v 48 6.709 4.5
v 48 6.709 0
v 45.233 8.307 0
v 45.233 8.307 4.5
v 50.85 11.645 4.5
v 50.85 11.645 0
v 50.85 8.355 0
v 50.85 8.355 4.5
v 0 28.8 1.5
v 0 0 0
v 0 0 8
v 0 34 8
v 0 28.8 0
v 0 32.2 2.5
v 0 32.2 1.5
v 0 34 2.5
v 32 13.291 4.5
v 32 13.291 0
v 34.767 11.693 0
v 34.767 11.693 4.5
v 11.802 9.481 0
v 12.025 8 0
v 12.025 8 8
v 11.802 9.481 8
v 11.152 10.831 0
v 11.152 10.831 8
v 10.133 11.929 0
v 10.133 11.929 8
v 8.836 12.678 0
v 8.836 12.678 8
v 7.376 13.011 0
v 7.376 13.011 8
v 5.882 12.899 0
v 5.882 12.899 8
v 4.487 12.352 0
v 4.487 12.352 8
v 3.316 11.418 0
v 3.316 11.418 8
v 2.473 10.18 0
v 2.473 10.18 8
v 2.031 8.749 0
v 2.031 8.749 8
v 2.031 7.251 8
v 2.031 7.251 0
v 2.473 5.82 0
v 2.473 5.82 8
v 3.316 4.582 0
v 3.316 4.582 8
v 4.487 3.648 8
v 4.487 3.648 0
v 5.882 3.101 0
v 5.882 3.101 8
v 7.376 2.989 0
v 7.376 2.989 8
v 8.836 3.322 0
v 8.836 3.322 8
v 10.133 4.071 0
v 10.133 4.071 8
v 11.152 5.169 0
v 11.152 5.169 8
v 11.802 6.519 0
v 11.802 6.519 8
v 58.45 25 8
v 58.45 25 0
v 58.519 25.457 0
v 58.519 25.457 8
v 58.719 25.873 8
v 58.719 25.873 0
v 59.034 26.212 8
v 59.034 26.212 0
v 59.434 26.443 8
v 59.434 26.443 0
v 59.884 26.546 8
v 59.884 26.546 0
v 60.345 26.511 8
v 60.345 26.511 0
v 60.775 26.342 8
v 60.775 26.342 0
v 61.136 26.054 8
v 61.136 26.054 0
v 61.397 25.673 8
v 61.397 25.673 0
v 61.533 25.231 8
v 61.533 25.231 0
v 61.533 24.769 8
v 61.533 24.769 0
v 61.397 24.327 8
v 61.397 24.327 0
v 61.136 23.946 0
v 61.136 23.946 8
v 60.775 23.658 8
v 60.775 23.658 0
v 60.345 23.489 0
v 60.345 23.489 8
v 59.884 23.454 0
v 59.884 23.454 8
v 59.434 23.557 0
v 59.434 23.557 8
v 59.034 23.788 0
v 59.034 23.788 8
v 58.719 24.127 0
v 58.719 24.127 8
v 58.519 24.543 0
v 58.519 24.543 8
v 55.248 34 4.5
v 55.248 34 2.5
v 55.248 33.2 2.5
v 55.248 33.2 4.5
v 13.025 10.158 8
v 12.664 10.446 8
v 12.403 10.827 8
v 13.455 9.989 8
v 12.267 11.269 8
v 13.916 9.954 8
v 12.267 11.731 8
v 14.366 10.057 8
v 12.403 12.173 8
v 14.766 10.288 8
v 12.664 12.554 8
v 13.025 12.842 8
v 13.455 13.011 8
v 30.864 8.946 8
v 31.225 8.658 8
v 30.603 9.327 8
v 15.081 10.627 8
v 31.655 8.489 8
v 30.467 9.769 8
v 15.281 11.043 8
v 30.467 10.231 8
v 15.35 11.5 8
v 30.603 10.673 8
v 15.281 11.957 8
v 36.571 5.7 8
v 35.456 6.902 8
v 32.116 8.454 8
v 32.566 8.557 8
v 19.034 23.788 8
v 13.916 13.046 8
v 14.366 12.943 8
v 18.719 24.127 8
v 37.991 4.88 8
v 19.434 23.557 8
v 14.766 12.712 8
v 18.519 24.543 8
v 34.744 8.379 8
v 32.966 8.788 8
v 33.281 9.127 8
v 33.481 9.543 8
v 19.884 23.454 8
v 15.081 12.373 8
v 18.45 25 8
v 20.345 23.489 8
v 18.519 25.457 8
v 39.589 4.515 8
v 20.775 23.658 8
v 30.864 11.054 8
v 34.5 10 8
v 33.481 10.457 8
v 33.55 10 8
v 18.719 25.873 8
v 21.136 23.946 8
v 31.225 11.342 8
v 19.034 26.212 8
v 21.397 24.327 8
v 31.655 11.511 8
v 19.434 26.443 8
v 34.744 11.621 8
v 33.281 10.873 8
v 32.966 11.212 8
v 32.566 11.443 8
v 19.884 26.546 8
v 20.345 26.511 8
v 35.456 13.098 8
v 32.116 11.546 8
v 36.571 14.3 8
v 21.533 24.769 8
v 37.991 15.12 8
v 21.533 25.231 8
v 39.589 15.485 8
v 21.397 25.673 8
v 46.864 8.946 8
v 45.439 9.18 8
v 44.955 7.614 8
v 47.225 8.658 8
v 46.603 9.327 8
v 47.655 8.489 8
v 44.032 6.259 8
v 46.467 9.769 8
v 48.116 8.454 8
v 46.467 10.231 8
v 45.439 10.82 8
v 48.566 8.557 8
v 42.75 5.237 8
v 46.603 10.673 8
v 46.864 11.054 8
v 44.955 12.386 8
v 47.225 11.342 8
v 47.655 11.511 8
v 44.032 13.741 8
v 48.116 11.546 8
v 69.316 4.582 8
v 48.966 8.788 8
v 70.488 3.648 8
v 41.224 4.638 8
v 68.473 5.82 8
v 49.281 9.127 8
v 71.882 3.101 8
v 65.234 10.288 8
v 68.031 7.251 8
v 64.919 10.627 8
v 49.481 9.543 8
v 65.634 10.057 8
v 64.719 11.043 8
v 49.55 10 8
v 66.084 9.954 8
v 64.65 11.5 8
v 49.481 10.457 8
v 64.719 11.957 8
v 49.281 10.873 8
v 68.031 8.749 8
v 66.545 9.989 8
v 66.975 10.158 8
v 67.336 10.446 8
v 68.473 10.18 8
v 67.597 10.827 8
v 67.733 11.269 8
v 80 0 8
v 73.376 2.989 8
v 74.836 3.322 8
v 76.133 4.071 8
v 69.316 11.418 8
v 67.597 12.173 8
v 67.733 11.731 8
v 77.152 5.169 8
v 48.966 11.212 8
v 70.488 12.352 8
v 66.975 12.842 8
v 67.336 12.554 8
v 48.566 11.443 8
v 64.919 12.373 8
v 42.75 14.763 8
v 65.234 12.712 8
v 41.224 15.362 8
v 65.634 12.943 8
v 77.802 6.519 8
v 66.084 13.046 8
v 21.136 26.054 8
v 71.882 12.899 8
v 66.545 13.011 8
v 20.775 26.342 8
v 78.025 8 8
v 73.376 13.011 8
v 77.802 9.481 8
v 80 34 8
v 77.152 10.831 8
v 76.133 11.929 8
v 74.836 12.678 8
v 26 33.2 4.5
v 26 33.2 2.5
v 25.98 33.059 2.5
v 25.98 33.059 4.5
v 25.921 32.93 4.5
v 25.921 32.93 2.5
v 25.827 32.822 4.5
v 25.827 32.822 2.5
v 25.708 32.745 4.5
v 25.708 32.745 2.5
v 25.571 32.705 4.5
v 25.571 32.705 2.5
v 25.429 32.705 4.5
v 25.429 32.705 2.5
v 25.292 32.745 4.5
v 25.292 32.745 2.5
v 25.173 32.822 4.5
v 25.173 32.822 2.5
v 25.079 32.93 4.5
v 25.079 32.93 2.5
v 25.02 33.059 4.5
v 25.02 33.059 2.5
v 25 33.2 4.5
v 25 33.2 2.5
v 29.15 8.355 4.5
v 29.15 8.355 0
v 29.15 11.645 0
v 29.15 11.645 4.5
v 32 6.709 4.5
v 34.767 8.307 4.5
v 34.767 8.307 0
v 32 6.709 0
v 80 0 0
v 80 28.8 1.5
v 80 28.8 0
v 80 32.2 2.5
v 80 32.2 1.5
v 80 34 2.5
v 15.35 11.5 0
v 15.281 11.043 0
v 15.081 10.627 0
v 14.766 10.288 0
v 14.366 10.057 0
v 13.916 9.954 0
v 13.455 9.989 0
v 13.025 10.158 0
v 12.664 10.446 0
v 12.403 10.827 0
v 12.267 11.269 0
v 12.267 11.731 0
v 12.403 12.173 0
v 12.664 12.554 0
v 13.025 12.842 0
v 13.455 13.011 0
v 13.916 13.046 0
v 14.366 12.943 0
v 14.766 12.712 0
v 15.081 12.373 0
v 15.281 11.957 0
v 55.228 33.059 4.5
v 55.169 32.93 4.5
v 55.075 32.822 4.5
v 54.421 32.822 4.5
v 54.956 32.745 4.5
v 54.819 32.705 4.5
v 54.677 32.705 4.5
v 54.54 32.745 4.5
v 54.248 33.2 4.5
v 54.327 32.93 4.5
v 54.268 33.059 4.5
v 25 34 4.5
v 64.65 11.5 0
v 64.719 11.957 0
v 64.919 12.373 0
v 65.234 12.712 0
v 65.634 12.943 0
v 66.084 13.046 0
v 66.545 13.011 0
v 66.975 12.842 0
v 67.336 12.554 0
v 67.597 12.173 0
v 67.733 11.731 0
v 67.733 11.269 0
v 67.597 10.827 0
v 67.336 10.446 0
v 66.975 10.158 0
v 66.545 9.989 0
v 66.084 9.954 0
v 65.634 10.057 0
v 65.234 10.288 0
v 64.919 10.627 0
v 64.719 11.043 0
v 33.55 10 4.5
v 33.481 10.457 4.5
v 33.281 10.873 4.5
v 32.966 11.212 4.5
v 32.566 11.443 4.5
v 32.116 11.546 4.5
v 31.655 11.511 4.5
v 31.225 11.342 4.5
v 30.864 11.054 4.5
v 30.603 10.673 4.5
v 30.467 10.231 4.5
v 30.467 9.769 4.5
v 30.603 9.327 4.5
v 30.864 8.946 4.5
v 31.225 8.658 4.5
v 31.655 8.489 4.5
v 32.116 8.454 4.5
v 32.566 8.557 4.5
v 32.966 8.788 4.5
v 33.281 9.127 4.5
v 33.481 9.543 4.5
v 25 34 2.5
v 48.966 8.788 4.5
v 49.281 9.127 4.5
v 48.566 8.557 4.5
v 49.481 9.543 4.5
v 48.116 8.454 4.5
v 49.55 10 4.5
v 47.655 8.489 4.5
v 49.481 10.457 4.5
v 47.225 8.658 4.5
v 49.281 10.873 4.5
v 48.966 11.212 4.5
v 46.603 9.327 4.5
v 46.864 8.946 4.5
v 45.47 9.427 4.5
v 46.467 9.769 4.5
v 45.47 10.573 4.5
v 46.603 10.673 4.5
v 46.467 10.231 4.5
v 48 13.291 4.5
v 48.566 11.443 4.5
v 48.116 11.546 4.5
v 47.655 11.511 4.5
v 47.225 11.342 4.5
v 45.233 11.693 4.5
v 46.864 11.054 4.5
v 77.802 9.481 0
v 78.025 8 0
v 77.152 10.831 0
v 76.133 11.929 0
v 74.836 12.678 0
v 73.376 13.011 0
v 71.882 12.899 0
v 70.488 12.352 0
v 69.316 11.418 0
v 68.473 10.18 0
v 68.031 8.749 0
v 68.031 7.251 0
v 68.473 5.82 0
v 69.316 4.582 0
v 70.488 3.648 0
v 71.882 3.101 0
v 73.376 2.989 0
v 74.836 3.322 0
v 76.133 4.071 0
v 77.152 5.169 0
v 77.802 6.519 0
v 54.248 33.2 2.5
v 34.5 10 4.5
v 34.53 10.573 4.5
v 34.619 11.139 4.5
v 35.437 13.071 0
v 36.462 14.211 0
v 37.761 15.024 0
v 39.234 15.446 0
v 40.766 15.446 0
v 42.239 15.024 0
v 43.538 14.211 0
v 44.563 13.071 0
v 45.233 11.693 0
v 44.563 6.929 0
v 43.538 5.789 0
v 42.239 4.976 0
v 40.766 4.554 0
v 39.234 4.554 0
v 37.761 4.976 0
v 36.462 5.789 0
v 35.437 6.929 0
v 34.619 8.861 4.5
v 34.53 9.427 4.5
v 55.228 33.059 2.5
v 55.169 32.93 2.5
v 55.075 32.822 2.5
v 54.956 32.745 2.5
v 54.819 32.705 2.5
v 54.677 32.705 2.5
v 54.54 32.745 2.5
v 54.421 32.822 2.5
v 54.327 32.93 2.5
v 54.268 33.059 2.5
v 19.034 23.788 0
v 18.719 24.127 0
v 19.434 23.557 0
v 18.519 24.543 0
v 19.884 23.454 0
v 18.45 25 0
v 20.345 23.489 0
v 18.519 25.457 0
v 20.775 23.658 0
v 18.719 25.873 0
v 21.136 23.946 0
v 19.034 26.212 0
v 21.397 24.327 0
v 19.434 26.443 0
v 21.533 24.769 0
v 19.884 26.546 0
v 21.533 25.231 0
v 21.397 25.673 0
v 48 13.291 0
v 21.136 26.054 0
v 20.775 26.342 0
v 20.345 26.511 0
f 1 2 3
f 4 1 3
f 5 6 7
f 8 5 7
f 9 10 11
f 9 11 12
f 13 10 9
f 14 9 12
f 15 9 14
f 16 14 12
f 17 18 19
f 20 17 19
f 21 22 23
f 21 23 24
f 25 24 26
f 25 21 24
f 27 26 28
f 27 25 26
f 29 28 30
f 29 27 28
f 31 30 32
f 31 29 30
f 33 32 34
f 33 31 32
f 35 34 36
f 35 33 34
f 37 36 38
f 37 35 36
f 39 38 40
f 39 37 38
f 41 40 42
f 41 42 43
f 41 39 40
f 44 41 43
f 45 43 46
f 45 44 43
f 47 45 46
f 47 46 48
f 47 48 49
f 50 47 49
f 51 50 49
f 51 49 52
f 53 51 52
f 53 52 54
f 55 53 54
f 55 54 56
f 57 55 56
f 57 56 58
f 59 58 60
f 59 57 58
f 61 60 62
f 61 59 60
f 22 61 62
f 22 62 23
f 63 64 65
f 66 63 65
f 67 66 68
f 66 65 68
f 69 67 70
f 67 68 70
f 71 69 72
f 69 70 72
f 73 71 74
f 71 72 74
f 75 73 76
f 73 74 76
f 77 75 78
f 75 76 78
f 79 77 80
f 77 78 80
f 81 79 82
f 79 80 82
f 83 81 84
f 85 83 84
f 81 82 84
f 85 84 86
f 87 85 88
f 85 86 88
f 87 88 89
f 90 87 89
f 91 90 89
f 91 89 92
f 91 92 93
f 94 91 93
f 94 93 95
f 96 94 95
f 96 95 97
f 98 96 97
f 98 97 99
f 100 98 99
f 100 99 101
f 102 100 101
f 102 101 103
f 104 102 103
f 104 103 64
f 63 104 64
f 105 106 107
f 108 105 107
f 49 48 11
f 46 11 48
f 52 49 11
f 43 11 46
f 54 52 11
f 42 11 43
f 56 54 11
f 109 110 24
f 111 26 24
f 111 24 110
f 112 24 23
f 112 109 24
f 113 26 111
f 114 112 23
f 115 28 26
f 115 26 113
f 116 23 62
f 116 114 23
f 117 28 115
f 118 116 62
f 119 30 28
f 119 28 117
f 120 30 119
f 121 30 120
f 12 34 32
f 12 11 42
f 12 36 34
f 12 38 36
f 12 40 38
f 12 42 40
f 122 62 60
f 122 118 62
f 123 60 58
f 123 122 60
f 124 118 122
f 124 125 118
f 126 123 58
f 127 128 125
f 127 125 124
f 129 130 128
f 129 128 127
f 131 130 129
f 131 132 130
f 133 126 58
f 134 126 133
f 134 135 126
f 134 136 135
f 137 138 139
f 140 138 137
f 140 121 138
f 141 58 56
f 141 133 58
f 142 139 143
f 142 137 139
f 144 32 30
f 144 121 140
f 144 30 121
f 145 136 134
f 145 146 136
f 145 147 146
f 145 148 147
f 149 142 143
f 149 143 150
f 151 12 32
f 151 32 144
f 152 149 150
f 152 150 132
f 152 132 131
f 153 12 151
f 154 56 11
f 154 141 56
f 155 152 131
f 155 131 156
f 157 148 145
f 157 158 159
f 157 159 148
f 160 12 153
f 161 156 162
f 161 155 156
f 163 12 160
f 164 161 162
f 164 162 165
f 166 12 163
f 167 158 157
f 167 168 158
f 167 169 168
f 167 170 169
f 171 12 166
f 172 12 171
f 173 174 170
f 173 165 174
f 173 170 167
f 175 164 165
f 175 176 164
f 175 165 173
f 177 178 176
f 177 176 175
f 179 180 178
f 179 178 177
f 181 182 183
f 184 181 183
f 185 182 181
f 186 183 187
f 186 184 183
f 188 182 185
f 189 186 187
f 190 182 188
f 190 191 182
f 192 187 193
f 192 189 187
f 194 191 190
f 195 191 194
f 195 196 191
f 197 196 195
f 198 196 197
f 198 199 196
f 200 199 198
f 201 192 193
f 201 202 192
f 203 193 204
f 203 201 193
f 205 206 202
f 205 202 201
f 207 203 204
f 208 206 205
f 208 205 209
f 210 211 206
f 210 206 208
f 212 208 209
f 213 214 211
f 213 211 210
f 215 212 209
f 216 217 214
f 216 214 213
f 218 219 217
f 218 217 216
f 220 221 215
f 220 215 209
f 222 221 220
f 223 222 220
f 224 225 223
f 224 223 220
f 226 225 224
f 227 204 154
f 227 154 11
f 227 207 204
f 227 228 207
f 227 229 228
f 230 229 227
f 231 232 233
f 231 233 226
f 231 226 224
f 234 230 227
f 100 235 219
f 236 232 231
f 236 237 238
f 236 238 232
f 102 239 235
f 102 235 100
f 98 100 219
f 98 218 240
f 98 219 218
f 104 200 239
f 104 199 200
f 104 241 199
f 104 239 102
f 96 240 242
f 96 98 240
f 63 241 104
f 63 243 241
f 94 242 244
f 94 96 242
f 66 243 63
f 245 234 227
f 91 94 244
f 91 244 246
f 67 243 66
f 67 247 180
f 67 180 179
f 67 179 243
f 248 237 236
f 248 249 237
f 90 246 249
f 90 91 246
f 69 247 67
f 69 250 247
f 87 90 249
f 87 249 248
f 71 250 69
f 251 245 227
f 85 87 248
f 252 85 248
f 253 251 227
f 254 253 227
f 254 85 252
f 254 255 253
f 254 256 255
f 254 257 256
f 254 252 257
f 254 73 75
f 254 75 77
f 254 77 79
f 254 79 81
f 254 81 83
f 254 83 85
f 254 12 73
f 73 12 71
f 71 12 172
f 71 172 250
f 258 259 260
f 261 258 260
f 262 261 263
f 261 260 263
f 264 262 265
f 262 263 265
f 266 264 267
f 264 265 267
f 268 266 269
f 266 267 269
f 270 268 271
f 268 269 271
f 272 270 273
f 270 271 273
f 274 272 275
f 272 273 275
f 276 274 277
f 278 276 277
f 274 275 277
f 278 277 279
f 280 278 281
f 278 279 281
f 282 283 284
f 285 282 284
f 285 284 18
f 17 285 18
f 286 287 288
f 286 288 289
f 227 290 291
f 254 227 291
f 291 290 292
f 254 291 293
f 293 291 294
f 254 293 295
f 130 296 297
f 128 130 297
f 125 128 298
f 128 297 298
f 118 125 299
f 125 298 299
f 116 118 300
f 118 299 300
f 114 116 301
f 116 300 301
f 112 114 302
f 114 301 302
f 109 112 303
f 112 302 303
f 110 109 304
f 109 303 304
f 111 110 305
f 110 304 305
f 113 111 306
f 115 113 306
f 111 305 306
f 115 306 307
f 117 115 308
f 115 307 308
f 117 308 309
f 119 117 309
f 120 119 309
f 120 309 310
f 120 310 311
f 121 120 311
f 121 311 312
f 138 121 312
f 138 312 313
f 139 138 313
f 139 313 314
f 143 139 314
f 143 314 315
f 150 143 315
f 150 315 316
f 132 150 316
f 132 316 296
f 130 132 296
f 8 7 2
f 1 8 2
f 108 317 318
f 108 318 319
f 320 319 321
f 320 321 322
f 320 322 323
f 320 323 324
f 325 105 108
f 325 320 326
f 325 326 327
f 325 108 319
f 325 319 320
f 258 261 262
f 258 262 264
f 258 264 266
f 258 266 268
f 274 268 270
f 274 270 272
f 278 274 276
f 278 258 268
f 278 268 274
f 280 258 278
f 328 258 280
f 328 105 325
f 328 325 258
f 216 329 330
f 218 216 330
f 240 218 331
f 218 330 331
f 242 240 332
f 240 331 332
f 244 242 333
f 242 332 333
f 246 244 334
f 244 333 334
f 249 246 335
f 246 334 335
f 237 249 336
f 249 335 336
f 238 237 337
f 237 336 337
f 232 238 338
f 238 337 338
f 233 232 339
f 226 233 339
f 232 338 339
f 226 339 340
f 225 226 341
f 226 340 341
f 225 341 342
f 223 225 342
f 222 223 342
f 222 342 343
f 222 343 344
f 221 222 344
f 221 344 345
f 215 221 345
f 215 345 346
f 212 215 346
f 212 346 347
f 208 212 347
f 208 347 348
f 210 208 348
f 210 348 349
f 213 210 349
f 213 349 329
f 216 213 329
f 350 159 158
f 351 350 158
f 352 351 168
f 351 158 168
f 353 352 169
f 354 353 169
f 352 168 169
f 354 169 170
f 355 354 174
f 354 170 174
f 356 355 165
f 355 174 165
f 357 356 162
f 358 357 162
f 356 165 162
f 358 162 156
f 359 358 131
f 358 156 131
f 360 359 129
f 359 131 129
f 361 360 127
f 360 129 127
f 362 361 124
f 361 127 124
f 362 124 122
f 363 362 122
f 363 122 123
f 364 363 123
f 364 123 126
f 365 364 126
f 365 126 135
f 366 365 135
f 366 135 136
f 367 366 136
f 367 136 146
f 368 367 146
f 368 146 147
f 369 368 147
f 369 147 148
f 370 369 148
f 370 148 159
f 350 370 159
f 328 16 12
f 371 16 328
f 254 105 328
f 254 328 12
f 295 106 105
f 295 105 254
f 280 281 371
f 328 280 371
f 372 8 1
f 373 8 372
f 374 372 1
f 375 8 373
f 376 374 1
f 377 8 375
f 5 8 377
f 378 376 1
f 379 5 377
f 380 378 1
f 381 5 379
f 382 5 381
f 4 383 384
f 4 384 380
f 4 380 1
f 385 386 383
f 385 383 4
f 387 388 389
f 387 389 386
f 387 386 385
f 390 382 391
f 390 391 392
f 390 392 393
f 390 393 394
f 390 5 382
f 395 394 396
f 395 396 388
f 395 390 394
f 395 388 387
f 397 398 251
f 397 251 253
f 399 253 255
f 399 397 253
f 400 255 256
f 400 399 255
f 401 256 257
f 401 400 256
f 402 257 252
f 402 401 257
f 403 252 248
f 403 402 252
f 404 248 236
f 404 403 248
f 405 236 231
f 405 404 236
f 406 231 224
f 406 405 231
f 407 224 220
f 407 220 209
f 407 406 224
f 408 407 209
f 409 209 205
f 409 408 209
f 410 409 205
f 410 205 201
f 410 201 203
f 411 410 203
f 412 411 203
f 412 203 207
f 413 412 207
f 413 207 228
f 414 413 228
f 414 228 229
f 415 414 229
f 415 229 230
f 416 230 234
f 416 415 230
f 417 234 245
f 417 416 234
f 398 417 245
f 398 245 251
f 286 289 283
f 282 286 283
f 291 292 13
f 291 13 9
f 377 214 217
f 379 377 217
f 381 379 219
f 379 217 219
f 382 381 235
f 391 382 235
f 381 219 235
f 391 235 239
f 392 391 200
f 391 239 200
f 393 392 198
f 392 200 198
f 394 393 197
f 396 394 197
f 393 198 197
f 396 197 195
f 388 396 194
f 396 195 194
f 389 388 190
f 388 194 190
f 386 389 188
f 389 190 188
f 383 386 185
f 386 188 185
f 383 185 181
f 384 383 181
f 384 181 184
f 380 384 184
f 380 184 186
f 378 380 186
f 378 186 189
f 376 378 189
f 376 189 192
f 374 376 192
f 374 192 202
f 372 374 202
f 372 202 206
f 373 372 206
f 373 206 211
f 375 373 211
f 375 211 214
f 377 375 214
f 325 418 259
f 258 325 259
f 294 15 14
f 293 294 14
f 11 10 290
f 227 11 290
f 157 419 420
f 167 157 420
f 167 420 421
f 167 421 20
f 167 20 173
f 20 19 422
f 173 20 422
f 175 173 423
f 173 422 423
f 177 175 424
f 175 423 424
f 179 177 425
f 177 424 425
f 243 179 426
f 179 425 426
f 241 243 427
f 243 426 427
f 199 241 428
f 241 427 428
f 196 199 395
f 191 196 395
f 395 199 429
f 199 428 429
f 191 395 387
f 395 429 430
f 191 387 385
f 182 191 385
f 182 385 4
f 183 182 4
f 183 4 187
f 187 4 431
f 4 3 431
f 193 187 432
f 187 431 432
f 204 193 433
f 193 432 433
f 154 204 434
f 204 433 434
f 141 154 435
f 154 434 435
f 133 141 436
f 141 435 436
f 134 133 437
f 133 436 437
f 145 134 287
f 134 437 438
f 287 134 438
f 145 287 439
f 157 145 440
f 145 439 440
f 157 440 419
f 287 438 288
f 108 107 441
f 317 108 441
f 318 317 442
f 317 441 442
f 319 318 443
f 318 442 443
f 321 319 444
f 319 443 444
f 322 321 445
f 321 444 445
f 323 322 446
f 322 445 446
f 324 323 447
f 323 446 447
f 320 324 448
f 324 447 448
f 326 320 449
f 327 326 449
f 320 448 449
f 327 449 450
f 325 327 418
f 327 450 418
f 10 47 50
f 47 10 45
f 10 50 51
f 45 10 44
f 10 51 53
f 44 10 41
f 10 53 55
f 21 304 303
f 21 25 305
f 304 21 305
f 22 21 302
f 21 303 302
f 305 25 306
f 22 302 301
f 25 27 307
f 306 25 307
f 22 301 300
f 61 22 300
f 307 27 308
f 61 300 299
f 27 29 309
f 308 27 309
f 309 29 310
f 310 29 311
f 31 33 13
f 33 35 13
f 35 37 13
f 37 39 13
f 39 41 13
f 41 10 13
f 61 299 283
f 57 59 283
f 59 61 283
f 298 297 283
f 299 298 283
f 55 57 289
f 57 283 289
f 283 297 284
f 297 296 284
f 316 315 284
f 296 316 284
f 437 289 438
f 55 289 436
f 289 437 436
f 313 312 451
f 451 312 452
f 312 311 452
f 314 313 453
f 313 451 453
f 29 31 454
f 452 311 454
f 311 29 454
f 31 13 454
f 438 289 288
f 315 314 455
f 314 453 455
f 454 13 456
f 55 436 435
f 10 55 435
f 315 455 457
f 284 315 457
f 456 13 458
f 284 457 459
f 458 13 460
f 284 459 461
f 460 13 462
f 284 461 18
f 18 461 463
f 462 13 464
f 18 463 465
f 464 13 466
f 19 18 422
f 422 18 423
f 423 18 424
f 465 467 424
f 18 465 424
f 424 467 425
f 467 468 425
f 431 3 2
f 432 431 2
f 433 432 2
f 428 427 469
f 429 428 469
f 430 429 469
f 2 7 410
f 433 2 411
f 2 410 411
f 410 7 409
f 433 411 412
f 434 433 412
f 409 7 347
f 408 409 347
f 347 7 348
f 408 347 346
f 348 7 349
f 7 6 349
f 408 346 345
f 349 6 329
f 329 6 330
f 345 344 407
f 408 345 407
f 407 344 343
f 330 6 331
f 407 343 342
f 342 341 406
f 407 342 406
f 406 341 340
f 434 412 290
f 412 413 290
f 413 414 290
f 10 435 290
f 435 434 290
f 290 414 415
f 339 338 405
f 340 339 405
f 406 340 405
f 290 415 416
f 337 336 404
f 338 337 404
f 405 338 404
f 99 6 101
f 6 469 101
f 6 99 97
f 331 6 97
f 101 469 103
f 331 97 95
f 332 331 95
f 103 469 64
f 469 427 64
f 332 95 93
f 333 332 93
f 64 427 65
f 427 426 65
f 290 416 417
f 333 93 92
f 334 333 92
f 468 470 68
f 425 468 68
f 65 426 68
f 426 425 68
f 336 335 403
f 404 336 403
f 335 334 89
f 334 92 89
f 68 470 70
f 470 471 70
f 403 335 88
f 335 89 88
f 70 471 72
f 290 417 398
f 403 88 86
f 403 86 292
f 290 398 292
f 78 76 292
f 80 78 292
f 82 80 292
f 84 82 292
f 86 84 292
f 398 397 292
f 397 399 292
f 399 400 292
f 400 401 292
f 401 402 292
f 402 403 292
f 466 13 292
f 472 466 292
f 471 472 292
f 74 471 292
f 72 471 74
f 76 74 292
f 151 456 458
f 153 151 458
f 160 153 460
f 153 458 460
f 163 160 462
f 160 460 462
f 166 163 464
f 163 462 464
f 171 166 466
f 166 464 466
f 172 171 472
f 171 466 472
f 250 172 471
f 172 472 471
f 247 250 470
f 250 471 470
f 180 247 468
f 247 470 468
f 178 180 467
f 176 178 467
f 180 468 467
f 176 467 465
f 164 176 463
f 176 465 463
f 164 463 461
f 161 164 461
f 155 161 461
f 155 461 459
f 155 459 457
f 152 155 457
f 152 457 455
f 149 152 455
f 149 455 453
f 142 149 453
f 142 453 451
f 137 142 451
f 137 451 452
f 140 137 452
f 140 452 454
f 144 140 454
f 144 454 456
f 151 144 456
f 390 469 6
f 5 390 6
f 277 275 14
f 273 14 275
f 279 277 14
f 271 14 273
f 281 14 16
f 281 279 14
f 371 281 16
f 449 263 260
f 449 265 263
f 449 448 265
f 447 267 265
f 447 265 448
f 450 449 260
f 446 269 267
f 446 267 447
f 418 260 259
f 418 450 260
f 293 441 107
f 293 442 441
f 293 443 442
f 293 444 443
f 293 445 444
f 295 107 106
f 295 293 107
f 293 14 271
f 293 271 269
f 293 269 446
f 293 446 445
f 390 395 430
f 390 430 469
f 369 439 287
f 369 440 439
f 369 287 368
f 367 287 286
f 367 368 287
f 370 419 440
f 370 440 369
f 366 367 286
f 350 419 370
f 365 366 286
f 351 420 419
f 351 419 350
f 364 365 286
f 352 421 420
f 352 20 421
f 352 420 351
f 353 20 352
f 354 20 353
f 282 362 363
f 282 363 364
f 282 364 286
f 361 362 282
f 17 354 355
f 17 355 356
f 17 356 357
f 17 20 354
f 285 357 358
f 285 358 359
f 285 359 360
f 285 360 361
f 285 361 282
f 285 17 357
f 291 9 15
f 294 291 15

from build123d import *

# Parameters (mm, degrees)
SKETCH_2_W           = 80
SKETCH_2_H           = 34
SKETCH_2_R           = 5.025
SKETCH_2_R_2         = 4.05
EXTRUDE_1_DEPTH      = 8
CUT_EXTRUDE_2_DEPTH  = 88.292611371
SKETCH_5_R           = 1.55
CUT_EXTRUDE_3_DEPTH  = 88.292611371
CUT_EXTRUDE_5_DEPTH  = 4.5
SKETCH_11_R          = 1.55
CUT_EXTRUDE_7_DEPTH  = 88.292611371
CUT_EXTRUDE_11_DEPTH = 2
SKETCH_22_R          = 1.55
CUT_EXTRUDE_13_DEPTH = 88.292611371
SKETCH_20_R          = 5.5
CUT_EXTRUDE_14_DEPTH = 88.292611371


with BuildPart() as part:
    # 草图2 → 凸台-拉伸1 (new body)
    with BuildSketch(Plane.XY):
        with Locations((40, 17)):
            Rectangle(SKETCH_2_W, SKETCH_2_H)
        with Locations((7, 8)):
            Circle(SKETCH_2_R, mode=Mode.SUBTRACT)
        with Locations((40, 10)):
            Circle(SKETCH_2_R_2, mode=Mode.SUBTRACT)
        with Locations((73, 8)):
            Circle(SKETCH_2_R, mode=Mode.SUBTRACT)
    extrude(amount=EXTRUDE_1_DEPTH)

    # 草图4 → 切除-拉伸2 (cut, through all)
    with BuildSketch(Plane(origin=(80, 0, 0), x_dir=(0, 0, -1), z_dir=(1, 0, 0))):
        Polygon((-1.5, 32.2), (-2.5, 32.2), (-2.5, 34), (0, 34), (0, 28.8), (-1.5, 28.8), align=None)
    extrude(amount=-CUT_EXTRUDE_2_DEPTH, mode=Mode.SUBTRACT)

    # 草图5 → 切除-拉伸3 (cut, through all)
    with BuildSketch(Plane.XY.offset(8)):
        with Locations((48, 10)):
            Circle(SKETCH_5_R)
        with Locations((32, 10)):
            Circle(SKETCH_5_R)
    extrude(amount=-CUT_EXTRUDE_3_DEPTH, mode=Mode.SUBTRACT)

    # 草图8 → 切除-拉伸5 (cut)
    with BuildSketch(Plane(origin=(0, 0, 0), x_dir=(-1, 0, 0), z_dir=(0, 0, -1))):
        Polygon((-45.15, 8.354551733), (-45.15, 11.645448267), (-48, 13.290896534), (-50.85, 11.645448267), (-50.85, 8.354551733), (-48, 6.709103466), align=None)
        Polygon((-34.85, 8.354551733), (-32, 6.709103466), (-29.15, 8.354551733), (-29.15, 11.645448267), (-32, 13.290896534), (-34.85, 11.645448267), align=None)
    extrude(amount=-CUT_EXTRUDE_5_DEPTH, mode=Mode.SUBTRACT)

    # 草图11 → 切除-拉伸7 (cut, through all)
    with BuildSketch(Plane(origin=(0, 0, 0), x_dir=(-1, 0, 0), z_dir=(0, 0, -1))):
        with Locations((-60, 25)):
            Circle(SKETCH_11_R)
        with Locations((-20, 25)):
            Circle(SKETCH_11_R)
    extrude(amount=-CUT_EXTRUDE_7_DEPTH, mode=Mode.SUBTRACT)

    # 草图19 → 切除-拉伸11 (cut)
    with BuildSketch(Plane(origin=(0, 0, 2.5), x_dir=(-1, 0, 0), z_dir=(0, 0, -1))):
        with BuildLine():
            Line((-25, 34), (-55.247938178, 34))
            Line((-55.247938178, 34), (-55.247938178, 33.2))
            ThreePointArc((-55.247938178, 33.2), (-54.747938178, 32.7), (-54.247938178, 33.2))
            Line((-54.247938178, 33.2), (-26, 33.2))
            ThreePointArc((-26, 33.2), (-25.5, 32.7), (-25, 33.2))
            Line((-25, 33.2), (-25, 34))
        make_face()
    extrude(amount=-CUT_EXTRUDE_11_DEPTH, mode=Mode.SUBTRACT)

    # 草图22 → 切除-拉伸13 (cut, through all)
    with BuildSketch(Plane(origin=(0, 0, 0), x_dir=(-1, 0, 0), z_dir=(0, 0, -1))):
        with Locations((-66.2, 11.5)):
            Circle(SKETCH_22_R)
        with Locations(Location((-13.8, 11.5, 0), (0, 0, 180))):
            Circle(SKETCH_22_R)
    extrude(amount=-CUT_EXTRUDE_13_DEPTH, mode=Mode.SUBTRACT)

    # 草图20 → 切除-拉伸14 (cut, through all)
    with BuildSketch(Plane(origin=(0, 0, 0), x_dir=(-1, 0, 0), z_dir=(0, 0, -1))):
        with Locations((-40, 10)):
            Circle(SKETCH_20_R)
    extrude(amount=-CUT_EXTRUDE_14_DEPTH, mode=Mode.SUBTRACT)


solid = part.part
